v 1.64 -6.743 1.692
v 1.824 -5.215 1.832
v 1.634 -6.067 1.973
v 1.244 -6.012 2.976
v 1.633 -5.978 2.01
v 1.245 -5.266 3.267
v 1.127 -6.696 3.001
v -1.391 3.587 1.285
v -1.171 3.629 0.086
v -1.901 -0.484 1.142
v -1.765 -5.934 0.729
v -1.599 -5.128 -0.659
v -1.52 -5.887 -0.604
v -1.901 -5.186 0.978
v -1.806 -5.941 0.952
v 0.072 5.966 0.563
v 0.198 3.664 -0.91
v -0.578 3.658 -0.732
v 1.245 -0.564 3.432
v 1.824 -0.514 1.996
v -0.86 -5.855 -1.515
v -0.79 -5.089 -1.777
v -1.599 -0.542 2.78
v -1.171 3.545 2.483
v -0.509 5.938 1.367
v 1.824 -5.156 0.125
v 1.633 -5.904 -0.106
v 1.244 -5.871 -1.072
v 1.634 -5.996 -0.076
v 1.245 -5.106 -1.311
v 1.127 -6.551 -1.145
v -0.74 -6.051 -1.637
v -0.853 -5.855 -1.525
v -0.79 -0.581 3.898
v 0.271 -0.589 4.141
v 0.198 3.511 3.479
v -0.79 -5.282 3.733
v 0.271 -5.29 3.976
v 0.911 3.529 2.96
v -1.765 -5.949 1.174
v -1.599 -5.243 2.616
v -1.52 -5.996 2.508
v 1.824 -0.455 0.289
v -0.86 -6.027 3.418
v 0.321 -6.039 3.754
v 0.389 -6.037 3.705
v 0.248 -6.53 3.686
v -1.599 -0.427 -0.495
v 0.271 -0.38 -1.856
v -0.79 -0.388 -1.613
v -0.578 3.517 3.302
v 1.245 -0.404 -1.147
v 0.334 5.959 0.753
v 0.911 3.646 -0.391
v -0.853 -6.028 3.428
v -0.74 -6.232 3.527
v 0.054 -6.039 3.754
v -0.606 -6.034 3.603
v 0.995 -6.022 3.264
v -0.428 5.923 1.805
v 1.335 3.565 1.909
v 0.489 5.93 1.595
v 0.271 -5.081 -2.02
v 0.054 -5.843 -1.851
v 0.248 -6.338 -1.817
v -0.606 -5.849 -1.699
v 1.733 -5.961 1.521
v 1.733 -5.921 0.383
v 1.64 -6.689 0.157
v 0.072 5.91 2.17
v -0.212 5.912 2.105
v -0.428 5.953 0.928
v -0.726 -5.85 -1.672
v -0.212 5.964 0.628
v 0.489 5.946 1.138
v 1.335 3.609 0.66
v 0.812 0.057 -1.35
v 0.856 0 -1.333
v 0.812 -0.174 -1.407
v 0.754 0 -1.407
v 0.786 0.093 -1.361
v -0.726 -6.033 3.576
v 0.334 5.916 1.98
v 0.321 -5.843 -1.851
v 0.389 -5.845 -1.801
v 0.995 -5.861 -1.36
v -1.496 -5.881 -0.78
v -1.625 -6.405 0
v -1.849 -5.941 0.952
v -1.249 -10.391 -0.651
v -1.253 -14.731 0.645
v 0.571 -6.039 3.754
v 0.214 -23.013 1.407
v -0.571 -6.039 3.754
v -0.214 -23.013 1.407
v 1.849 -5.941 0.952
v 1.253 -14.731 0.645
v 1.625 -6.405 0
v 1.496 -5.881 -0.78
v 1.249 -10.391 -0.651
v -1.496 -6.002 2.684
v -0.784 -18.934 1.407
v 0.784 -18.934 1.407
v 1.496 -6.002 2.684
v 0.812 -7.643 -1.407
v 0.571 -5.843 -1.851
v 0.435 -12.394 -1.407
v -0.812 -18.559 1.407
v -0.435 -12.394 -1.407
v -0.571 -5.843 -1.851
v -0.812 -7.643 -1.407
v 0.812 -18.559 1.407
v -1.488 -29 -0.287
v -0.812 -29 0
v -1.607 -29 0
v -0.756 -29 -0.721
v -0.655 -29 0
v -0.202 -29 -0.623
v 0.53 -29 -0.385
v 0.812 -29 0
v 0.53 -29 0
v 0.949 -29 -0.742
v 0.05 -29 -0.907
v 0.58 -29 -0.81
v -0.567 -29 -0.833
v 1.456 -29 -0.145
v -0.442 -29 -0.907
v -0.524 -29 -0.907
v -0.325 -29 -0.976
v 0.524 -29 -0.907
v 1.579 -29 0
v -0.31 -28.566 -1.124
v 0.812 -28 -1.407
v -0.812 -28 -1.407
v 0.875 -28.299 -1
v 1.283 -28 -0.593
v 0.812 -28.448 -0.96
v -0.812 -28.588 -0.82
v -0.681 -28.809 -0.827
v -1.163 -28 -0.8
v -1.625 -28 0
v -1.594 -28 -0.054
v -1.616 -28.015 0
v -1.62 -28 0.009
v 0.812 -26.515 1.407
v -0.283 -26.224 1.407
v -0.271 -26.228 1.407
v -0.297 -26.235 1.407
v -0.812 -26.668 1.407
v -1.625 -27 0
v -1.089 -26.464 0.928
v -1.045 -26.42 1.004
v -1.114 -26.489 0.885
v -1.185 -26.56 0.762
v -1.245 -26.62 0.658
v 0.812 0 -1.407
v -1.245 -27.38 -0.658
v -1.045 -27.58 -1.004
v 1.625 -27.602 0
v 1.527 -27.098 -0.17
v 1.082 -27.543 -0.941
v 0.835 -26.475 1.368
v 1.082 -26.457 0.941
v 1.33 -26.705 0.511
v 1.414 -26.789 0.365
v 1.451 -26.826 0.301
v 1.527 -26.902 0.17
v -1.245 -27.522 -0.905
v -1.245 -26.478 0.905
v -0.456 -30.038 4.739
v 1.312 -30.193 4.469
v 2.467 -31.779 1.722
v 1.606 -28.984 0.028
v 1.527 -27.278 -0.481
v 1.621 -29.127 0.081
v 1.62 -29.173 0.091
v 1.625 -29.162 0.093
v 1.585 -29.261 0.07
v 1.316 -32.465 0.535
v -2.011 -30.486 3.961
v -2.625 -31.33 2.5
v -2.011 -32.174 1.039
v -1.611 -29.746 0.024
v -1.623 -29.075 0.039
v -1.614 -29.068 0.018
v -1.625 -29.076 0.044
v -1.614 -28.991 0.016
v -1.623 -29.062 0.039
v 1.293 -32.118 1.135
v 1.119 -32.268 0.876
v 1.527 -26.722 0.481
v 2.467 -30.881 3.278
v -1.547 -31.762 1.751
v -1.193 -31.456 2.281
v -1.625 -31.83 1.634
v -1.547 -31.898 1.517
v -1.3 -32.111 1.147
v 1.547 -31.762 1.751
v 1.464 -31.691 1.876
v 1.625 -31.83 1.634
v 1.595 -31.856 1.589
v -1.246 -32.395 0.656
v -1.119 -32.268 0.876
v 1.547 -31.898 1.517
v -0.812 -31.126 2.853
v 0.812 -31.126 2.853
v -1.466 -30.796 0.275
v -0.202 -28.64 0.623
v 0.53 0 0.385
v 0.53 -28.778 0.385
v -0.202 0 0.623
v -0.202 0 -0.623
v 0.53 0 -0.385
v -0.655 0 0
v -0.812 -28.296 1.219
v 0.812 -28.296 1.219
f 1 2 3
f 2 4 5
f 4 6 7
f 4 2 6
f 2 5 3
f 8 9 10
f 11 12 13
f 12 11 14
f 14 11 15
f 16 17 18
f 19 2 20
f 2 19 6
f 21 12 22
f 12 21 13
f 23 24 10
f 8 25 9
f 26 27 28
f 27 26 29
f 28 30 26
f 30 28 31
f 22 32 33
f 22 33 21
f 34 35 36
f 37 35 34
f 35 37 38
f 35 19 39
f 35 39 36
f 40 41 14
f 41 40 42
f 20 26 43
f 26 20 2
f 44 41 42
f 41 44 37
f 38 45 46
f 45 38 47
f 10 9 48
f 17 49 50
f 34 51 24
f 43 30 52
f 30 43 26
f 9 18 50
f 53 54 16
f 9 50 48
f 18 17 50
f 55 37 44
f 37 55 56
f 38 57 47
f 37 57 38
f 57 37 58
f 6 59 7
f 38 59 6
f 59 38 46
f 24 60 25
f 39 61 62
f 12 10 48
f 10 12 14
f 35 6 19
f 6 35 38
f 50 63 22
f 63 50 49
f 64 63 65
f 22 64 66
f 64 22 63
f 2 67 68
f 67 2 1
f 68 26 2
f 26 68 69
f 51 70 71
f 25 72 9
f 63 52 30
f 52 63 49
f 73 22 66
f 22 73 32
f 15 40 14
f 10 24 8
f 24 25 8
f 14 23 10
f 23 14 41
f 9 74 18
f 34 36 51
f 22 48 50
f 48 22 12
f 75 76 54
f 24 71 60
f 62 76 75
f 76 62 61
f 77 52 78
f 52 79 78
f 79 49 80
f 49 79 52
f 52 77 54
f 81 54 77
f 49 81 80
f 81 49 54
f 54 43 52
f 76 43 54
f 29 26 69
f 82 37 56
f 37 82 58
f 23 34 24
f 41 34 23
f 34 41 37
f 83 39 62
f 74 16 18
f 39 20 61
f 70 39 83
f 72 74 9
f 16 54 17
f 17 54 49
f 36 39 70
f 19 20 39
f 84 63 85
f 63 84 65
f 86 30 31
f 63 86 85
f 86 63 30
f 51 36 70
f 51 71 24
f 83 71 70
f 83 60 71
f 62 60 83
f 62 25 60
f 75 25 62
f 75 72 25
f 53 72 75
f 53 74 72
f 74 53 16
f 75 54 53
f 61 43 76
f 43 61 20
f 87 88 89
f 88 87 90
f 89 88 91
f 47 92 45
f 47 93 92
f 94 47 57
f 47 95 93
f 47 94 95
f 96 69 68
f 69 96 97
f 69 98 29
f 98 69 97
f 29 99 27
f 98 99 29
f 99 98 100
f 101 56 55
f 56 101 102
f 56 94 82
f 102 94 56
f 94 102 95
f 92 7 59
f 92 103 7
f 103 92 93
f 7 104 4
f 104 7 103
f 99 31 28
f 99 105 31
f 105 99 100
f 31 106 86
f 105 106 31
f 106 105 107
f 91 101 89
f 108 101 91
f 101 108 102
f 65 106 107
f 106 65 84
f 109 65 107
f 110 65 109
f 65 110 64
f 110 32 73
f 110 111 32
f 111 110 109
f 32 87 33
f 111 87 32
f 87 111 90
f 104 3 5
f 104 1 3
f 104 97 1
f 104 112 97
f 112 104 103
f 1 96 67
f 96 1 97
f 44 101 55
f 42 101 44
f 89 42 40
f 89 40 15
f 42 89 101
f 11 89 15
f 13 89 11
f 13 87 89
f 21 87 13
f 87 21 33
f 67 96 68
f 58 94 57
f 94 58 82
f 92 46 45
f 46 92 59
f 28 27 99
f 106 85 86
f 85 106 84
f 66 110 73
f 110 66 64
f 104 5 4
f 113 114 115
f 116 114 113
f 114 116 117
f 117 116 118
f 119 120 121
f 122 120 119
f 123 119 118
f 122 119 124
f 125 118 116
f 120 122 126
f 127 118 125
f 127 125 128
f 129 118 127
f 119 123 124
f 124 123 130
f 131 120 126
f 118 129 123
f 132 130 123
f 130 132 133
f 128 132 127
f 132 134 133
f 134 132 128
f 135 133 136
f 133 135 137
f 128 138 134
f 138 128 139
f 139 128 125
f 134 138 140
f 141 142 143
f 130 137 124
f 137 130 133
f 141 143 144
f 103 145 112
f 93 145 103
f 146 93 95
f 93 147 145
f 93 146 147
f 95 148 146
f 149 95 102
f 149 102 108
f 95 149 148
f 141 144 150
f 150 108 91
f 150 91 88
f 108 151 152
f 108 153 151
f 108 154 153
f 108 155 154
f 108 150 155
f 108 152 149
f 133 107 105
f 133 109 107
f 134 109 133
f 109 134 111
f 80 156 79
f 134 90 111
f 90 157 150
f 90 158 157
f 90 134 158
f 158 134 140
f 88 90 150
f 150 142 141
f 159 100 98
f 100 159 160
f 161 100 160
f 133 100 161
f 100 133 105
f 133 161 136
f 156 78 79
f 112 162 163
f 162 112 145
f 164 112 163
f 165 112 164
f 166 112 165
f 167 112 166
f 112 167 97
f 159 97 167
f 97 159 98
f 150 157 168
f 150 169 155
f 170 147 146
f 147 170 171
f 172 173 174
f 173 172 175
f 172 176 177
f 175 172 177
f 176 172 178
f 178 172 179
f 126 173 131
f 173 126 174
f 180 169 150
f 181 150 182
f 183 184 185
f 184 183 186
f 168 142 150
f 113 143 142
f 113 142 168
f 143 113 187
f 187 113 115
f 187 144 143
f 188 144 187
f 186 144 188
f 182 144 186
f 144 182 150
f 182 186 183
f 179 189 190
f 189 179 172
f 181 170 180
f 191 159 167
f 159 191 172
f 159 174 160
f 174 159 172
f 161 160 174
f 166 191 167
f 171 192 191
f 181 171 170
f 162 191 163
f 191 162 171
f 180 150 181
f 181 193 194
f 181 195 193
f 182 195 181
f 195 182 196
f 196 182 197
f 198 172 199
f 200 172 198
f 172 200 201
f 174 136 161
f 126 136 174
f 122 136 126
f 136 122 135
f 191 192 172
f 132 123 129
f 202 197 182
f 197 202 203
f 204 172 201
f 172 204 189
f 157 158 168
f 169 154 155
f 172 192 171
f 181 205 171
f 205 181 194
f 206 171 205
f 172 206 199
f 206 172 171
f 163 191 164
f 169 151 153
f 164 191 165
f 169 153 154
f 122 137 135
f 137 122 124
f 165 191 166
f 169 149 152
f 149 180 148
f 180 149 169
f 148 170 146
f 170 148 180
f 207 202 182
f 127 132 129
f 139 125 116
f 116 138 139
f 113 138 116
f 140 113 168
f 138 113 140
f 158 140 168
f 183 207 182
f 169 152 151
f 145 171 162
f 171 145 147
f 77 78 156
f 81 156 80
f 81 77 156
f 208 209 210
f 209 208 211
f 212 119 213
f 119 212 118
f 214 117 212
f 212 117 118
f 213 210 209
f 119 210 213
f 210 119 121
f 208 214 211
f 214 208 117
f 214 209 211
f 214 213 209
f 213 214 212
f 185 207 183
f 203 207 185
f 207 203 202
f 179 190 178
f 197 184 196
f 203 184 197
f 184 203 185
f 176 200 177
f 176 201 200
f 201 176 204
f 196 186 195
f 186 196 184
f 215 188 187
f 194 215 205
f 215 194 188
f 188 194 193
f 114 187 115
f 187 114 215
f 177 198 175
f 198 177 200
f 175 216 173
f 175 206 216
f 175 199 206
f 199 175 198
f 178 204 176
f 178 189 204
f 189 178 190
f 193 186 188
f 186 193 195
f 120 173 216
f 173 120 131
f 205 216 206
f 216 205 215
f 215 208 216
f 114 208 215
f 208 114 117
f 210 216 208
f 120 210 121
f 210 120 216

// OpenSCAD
//use <sweep.scad>;

diam = 3.25;
tine = 1.31;
arm = 29; //27.75;

gird = 5.25;

rotate([90,180,]) difference() {
    union() {
        rotate([-2,0,0]) resize([diam+0.5,6,arm*1.35]) translate([0,-1.2,1]) raindrop3D(diam,true);
        cylinder(arm-1,diam/2,diam/2,false);
        intersection() { 
            cylinder(arm,diam/2,diam/2,false);        
           translate([0,0, arm-1]) sphere(diam/2);
        }
        
        translate([0,0,arm-2]) color([1,0,0]) rotate([30,0,0]) cylinder(5,diam/2,gird/2,false);
        sphere(diam/2);

    }
    cylinder(arm+5,tine/2,tine/2,false);
    translate([0,0,arm]) cylinder(arm+5,diam/2,diam/2,false);
    translate([0,0,arm]) rotate([30,0,0]) cylinder(arm+5,diam/2,diam/2,false);

    translate([-5,0,arm]) cube(10,10,10);
}

//shape_points = square(10);
//path_transforms1 = [for (i=[0:pathstep:height]) let(t=i/height) translation([func1(t),func1(t),i]) * rotation([0,0,func4(t)])];
//sweep(shape_points, path_transforms1);


/*
Creates either a 2 dimensional raindrop shape that can be extruded, or a 3 dimensional raindrop shape.

Module raindrop2D creates a 2 dimensional raindrop shape.
parameters:
	thick		height of the extrusion
	radius		radius of the circle on the bottom of the raindrop shape
	centered	boolean value. sets the bottom circle as centered (true) on [0, 0, 0],
				or sets the entire object in the positive [x, y, z] quadrant
				
Module raindrop3D creates a 2 dimensional raindrop shape.
parameters:
	radius		radius of the sphere on the bottom of the raindrop shape
	centered	boolean value. sets the bottom sphere as centered (true) on [0, 0, 0],
				or sets the entire object in the positive [x, y, z] quadrant
*/

//example();

module raindrop2D(thick, radius, centered = true){
	if(!centered){
		translate([radius, radius, 0]){
			cylinder(h = thick, r = radius);
			linear_extrude(height = thick)
			polygon(points=[[radius * -cos(20), radius * sin(20)],[radius * cos(20), radius * sin(20)],[0, radius * 3]], paths=[[0,1,2]]);
		}
	}else if(centered){
		cylinder(h = thick, r = radius);
		linear_extrude(height = thick)
		polygon(points=[[radius * -cos(20), radius * sin(20)],[radius * cos(20), radius * sin(20)],[0, radius * 3]], paths=[[0,1,2]]);
	}	
}//end of module raindrop2D

module raindrop3D(radius, centered = true){
	if(!centered){
		translate([radius, radius, radius]){
			sphere(radius);
			translate([0, 0, radius * sin(20)]) cylinder(h = radius*3, r1 = radius * cos(20), r2 = 0);
		}
	}else if(centered){
		sphere(radius);
		translate([0, 0, radius*sin(20)]) cylinder(h = radius*3, r1 = radius * cos(20), r2 = 0);
	}	
}//end of module raindrop3D

module example(){
	raindrop2D(10, 10, false);
	translate([30, 0, 0]) raindrop3D(10, false);
}//end of module example
